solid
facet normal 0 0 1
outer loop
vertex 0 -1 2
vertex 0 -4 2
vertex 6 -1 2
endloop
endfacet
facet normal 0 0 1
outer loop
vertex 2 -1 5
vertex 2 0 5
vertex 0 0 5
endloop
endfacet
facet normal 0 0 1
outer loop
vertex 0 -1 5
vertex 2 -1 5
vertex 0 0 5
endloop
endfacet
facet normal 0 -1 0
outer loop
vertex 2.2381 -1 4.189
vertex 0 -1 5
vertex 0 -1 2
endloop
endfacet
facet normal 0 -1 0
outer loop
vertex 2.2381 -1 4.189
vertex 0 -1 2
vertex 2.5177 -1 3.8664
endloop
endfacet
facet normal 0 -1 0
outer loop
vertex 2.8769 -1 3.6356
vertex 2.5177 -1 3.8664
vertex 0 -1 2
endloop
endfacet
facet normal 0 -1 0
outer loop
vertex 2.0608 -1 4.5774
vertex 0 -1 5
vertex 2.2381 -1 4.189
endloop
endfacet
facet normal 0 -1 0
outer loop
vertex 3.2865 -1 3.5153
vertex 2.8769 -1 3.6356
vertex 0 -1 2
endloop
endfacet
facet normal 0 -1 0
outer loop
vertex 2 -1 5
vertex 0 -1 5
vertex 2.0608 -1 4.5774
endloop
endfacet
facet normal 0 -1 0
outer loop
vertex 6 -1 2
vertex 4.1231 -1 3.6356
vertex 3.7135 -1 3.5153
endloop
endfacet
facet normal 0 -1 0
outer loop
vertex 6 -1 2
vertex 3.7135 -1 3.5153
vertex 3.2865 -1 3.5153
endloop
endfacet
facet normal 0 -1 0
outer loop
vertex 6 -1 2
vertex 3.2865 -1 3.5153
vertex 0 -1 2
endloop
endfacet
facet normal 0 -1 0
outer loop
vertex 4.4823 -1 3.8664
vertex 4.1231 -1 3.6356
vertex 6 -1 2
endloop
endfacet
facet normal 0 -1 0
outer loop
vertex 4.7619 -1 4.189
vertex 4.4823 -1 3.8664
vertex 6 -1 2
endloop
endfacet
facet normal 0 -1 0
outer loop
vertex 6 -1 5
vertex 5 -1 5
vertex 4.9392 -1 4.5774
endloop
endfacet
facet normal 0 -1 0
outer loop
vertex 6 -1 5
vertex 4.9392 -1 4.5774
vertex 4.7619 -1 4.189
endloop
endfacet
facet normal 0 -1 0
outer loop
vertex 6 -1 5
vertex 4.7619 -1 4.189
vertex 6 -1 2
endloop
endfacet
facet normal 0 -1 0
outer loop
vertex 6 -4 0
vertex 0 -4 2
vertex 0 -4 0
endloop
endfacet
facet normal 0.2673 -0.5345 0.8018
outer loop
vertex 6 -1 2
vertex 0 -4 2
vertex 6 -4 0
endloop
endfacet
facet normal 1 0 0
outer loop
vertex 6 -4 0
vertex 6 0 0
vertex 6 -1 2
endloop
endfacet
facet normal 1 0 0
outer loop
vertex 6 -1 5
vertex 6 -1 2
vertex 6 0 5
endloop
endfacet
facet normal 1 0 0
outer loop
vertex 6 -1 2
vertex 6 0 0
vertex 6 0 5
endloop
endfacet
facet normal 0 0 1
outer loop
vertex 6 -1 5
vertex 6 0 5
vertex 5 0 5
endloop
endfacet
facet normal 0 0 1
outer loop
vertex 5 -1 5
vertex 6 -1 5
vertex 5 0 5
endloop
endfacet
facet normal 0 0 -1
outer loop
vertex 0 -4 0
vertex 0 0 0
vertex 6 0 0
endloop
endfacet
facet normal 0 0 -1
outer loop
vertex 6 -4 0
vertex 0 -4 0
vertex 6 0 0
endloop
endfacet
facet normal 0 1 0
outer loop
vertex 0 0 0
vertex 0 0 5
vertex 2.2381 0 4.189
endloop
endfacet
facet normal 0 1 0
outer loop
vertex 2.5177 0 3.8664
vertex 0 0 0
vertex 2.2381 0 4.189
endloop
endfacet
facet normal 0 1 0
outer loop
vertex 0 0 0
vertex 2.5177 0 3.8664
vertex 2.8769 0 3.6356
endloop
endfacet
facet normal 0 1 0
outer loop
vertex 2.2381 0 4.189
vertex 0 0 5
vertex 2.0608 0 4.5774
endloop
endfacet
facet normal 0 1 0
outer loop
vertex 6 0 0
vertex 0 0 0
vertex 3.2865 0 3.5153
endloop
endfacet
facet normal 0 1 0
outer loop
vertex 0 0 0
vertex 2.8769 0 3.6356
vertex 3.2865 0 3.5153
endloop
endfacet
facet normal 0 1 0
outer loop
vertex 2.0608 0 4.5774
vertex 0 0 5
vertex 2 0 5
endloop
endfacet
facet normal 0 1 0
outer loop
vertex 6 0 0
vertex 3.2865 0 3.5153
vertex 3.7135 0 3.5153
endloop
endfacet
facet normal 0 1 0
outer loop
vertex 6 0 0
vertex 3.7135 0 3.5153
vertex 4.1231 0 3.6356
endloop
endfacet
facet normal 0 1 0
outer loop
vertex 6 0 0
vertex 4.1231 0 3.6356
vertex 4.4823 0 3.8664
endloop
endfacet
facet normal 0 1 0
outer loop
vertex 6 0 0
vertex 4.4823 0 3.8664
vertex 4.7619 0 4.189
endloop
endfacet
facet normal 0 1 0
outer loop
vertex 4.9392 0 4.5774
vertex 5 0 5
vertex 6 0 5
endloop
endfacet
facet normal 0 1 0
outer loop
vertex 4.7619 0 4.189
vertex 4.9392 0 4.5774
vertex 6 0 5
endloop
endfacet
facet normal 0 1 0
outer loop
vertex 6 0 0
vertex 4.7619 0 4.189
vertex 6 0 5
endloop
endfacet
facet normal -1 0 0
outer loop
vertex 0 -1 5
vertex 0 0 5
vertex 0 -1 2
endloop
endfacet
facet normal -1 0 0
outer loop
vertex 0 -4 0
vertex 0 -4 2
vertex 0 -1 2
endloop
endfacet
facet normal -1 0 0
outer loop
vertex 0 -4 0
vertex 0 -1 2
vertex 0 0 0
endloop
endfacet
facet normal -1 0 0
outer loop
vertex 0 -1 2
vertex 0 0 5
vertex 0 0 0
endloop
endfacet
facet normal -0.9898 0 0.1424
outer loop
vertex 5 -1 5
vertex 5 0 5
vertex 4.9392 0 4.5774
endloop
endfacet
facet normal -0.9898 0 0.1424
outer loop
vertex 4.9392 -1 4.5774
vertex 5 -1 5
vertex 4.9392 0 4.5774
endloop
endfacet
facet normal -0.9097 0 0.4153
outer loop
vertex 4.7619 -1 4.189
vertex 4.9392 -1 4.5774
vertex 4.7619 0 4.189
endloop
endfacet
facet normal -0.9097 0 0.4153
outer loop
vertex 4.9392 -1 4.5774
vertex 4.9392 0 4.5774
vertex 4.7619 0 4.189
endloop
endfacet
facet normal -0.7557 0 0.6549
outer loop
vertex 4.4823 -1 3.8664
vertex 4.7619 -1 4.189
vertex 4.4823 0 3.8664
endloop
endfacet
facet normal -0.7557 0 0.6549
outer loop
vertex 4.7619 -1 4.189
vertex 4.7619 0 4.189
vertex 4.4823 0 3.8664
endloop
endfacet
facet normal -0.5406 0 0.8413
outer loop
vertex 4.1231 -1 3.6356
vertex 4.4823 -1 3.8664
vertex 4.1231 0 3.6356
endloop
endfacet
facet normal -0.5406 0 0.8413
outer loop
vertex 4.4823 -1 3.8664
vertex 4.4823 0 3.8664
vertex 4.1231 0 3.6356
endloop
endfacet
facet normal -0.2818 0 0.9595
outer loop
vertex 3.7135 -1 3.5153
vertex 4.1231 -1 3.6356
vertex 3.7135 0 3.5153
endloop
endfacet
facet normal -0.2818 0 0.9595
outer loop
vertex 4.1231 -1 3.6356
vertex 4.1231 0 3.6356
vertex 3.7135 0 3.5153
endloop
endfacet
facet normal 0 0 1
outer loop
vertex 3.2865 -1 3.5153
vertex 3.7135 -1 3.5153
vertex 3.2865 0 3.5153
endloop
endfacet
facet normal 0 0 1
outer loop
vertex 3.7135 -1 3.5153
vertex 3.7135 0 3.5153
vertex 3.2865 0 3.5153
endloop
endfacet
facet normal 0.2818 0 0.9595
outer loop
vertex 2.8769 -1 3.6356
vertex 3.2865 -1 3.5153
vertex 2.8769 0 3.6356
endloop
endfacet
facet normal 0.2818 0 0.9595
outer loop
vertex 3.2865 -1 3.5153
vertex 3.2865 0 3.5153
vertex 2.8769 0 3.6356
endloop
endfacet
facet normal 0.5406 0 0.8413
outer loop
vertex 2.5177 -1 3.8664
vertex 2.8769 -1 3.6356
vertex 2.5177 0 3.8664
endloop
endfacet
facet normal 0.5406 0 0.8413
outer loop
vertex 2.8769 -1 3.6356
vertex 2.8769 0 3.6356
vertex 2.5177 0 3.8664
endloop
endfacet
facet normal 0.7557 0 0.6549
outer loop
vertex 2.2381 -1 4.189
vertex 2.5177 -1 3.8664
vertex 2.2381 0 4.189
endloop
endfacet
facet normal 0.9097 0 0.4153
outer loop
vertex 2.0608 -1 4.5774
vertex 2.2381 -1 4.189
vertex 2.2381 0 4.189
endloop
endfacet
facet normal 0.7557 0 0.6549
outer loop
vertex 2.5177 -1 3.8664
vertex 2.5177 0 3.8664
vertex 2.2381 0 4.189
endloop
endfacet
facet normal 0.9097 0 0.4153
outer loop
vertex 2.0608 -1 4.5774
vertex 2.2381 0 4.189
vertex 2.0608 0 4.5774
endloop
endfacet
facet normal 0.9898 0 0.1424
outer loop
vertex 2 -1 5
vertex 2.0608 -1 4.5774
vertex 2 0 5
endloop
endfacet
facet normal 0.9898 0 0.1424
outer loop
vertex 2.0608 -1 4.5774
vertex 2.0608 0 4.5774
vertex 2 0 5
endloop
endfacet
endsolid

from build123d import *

# Parameters (mm, degrees)
F1_DEPTH = 4
F2_W     = 6
F2_H     = 3
F3_DEPTH = 3
F6_DEPTH = 4.0099186287


with BuildPart() as f1:
    # F0 (on Front) → F1 (new body)
    with BuildSketch(Plane.XZ):
        with BuildLine():
            Line((0, 5), (0, 0))
            Line((0, 0), (6, 0))
            Line((6, 0), (6, 5))
            Line((6, 5), (5, 5))
            ThreePointArc((5, 5), (3.5, 3.5), (2, 5))
            Line((2, 5), (0, 5))
        make_face()
    extrude(amount=F1_DEPTH)

    # F2 (on face) → F3 (cut)
    with BuildSketch(Plane.XZ.offset(4)):
        with Locations((3, 3.5)):
            Rectangle(F2_W, F2_H)
    extrude(amount=-F3_DEPTH, mode=Mode.SUBTRACT)

    # F5 (on 3pt) → F6 (cut, through all)
    with BuildSketch(Plane(origin=(1, -2, 3), x_dir=(0.9636241117, 0.1482498633, -0.222374795), z_dir=(-0.2672612419, 0.5345224838, -0.8017837257))):
        Polygon((5.1887452166, 3.3282011774), (-1.0377490433, 2.2188007849), (5.1887452166, -0.2773500981), align=None)
    extrude(amount=-F6_DEPTH, mode=Mode.SUBTRACT)


solid = f1.part
